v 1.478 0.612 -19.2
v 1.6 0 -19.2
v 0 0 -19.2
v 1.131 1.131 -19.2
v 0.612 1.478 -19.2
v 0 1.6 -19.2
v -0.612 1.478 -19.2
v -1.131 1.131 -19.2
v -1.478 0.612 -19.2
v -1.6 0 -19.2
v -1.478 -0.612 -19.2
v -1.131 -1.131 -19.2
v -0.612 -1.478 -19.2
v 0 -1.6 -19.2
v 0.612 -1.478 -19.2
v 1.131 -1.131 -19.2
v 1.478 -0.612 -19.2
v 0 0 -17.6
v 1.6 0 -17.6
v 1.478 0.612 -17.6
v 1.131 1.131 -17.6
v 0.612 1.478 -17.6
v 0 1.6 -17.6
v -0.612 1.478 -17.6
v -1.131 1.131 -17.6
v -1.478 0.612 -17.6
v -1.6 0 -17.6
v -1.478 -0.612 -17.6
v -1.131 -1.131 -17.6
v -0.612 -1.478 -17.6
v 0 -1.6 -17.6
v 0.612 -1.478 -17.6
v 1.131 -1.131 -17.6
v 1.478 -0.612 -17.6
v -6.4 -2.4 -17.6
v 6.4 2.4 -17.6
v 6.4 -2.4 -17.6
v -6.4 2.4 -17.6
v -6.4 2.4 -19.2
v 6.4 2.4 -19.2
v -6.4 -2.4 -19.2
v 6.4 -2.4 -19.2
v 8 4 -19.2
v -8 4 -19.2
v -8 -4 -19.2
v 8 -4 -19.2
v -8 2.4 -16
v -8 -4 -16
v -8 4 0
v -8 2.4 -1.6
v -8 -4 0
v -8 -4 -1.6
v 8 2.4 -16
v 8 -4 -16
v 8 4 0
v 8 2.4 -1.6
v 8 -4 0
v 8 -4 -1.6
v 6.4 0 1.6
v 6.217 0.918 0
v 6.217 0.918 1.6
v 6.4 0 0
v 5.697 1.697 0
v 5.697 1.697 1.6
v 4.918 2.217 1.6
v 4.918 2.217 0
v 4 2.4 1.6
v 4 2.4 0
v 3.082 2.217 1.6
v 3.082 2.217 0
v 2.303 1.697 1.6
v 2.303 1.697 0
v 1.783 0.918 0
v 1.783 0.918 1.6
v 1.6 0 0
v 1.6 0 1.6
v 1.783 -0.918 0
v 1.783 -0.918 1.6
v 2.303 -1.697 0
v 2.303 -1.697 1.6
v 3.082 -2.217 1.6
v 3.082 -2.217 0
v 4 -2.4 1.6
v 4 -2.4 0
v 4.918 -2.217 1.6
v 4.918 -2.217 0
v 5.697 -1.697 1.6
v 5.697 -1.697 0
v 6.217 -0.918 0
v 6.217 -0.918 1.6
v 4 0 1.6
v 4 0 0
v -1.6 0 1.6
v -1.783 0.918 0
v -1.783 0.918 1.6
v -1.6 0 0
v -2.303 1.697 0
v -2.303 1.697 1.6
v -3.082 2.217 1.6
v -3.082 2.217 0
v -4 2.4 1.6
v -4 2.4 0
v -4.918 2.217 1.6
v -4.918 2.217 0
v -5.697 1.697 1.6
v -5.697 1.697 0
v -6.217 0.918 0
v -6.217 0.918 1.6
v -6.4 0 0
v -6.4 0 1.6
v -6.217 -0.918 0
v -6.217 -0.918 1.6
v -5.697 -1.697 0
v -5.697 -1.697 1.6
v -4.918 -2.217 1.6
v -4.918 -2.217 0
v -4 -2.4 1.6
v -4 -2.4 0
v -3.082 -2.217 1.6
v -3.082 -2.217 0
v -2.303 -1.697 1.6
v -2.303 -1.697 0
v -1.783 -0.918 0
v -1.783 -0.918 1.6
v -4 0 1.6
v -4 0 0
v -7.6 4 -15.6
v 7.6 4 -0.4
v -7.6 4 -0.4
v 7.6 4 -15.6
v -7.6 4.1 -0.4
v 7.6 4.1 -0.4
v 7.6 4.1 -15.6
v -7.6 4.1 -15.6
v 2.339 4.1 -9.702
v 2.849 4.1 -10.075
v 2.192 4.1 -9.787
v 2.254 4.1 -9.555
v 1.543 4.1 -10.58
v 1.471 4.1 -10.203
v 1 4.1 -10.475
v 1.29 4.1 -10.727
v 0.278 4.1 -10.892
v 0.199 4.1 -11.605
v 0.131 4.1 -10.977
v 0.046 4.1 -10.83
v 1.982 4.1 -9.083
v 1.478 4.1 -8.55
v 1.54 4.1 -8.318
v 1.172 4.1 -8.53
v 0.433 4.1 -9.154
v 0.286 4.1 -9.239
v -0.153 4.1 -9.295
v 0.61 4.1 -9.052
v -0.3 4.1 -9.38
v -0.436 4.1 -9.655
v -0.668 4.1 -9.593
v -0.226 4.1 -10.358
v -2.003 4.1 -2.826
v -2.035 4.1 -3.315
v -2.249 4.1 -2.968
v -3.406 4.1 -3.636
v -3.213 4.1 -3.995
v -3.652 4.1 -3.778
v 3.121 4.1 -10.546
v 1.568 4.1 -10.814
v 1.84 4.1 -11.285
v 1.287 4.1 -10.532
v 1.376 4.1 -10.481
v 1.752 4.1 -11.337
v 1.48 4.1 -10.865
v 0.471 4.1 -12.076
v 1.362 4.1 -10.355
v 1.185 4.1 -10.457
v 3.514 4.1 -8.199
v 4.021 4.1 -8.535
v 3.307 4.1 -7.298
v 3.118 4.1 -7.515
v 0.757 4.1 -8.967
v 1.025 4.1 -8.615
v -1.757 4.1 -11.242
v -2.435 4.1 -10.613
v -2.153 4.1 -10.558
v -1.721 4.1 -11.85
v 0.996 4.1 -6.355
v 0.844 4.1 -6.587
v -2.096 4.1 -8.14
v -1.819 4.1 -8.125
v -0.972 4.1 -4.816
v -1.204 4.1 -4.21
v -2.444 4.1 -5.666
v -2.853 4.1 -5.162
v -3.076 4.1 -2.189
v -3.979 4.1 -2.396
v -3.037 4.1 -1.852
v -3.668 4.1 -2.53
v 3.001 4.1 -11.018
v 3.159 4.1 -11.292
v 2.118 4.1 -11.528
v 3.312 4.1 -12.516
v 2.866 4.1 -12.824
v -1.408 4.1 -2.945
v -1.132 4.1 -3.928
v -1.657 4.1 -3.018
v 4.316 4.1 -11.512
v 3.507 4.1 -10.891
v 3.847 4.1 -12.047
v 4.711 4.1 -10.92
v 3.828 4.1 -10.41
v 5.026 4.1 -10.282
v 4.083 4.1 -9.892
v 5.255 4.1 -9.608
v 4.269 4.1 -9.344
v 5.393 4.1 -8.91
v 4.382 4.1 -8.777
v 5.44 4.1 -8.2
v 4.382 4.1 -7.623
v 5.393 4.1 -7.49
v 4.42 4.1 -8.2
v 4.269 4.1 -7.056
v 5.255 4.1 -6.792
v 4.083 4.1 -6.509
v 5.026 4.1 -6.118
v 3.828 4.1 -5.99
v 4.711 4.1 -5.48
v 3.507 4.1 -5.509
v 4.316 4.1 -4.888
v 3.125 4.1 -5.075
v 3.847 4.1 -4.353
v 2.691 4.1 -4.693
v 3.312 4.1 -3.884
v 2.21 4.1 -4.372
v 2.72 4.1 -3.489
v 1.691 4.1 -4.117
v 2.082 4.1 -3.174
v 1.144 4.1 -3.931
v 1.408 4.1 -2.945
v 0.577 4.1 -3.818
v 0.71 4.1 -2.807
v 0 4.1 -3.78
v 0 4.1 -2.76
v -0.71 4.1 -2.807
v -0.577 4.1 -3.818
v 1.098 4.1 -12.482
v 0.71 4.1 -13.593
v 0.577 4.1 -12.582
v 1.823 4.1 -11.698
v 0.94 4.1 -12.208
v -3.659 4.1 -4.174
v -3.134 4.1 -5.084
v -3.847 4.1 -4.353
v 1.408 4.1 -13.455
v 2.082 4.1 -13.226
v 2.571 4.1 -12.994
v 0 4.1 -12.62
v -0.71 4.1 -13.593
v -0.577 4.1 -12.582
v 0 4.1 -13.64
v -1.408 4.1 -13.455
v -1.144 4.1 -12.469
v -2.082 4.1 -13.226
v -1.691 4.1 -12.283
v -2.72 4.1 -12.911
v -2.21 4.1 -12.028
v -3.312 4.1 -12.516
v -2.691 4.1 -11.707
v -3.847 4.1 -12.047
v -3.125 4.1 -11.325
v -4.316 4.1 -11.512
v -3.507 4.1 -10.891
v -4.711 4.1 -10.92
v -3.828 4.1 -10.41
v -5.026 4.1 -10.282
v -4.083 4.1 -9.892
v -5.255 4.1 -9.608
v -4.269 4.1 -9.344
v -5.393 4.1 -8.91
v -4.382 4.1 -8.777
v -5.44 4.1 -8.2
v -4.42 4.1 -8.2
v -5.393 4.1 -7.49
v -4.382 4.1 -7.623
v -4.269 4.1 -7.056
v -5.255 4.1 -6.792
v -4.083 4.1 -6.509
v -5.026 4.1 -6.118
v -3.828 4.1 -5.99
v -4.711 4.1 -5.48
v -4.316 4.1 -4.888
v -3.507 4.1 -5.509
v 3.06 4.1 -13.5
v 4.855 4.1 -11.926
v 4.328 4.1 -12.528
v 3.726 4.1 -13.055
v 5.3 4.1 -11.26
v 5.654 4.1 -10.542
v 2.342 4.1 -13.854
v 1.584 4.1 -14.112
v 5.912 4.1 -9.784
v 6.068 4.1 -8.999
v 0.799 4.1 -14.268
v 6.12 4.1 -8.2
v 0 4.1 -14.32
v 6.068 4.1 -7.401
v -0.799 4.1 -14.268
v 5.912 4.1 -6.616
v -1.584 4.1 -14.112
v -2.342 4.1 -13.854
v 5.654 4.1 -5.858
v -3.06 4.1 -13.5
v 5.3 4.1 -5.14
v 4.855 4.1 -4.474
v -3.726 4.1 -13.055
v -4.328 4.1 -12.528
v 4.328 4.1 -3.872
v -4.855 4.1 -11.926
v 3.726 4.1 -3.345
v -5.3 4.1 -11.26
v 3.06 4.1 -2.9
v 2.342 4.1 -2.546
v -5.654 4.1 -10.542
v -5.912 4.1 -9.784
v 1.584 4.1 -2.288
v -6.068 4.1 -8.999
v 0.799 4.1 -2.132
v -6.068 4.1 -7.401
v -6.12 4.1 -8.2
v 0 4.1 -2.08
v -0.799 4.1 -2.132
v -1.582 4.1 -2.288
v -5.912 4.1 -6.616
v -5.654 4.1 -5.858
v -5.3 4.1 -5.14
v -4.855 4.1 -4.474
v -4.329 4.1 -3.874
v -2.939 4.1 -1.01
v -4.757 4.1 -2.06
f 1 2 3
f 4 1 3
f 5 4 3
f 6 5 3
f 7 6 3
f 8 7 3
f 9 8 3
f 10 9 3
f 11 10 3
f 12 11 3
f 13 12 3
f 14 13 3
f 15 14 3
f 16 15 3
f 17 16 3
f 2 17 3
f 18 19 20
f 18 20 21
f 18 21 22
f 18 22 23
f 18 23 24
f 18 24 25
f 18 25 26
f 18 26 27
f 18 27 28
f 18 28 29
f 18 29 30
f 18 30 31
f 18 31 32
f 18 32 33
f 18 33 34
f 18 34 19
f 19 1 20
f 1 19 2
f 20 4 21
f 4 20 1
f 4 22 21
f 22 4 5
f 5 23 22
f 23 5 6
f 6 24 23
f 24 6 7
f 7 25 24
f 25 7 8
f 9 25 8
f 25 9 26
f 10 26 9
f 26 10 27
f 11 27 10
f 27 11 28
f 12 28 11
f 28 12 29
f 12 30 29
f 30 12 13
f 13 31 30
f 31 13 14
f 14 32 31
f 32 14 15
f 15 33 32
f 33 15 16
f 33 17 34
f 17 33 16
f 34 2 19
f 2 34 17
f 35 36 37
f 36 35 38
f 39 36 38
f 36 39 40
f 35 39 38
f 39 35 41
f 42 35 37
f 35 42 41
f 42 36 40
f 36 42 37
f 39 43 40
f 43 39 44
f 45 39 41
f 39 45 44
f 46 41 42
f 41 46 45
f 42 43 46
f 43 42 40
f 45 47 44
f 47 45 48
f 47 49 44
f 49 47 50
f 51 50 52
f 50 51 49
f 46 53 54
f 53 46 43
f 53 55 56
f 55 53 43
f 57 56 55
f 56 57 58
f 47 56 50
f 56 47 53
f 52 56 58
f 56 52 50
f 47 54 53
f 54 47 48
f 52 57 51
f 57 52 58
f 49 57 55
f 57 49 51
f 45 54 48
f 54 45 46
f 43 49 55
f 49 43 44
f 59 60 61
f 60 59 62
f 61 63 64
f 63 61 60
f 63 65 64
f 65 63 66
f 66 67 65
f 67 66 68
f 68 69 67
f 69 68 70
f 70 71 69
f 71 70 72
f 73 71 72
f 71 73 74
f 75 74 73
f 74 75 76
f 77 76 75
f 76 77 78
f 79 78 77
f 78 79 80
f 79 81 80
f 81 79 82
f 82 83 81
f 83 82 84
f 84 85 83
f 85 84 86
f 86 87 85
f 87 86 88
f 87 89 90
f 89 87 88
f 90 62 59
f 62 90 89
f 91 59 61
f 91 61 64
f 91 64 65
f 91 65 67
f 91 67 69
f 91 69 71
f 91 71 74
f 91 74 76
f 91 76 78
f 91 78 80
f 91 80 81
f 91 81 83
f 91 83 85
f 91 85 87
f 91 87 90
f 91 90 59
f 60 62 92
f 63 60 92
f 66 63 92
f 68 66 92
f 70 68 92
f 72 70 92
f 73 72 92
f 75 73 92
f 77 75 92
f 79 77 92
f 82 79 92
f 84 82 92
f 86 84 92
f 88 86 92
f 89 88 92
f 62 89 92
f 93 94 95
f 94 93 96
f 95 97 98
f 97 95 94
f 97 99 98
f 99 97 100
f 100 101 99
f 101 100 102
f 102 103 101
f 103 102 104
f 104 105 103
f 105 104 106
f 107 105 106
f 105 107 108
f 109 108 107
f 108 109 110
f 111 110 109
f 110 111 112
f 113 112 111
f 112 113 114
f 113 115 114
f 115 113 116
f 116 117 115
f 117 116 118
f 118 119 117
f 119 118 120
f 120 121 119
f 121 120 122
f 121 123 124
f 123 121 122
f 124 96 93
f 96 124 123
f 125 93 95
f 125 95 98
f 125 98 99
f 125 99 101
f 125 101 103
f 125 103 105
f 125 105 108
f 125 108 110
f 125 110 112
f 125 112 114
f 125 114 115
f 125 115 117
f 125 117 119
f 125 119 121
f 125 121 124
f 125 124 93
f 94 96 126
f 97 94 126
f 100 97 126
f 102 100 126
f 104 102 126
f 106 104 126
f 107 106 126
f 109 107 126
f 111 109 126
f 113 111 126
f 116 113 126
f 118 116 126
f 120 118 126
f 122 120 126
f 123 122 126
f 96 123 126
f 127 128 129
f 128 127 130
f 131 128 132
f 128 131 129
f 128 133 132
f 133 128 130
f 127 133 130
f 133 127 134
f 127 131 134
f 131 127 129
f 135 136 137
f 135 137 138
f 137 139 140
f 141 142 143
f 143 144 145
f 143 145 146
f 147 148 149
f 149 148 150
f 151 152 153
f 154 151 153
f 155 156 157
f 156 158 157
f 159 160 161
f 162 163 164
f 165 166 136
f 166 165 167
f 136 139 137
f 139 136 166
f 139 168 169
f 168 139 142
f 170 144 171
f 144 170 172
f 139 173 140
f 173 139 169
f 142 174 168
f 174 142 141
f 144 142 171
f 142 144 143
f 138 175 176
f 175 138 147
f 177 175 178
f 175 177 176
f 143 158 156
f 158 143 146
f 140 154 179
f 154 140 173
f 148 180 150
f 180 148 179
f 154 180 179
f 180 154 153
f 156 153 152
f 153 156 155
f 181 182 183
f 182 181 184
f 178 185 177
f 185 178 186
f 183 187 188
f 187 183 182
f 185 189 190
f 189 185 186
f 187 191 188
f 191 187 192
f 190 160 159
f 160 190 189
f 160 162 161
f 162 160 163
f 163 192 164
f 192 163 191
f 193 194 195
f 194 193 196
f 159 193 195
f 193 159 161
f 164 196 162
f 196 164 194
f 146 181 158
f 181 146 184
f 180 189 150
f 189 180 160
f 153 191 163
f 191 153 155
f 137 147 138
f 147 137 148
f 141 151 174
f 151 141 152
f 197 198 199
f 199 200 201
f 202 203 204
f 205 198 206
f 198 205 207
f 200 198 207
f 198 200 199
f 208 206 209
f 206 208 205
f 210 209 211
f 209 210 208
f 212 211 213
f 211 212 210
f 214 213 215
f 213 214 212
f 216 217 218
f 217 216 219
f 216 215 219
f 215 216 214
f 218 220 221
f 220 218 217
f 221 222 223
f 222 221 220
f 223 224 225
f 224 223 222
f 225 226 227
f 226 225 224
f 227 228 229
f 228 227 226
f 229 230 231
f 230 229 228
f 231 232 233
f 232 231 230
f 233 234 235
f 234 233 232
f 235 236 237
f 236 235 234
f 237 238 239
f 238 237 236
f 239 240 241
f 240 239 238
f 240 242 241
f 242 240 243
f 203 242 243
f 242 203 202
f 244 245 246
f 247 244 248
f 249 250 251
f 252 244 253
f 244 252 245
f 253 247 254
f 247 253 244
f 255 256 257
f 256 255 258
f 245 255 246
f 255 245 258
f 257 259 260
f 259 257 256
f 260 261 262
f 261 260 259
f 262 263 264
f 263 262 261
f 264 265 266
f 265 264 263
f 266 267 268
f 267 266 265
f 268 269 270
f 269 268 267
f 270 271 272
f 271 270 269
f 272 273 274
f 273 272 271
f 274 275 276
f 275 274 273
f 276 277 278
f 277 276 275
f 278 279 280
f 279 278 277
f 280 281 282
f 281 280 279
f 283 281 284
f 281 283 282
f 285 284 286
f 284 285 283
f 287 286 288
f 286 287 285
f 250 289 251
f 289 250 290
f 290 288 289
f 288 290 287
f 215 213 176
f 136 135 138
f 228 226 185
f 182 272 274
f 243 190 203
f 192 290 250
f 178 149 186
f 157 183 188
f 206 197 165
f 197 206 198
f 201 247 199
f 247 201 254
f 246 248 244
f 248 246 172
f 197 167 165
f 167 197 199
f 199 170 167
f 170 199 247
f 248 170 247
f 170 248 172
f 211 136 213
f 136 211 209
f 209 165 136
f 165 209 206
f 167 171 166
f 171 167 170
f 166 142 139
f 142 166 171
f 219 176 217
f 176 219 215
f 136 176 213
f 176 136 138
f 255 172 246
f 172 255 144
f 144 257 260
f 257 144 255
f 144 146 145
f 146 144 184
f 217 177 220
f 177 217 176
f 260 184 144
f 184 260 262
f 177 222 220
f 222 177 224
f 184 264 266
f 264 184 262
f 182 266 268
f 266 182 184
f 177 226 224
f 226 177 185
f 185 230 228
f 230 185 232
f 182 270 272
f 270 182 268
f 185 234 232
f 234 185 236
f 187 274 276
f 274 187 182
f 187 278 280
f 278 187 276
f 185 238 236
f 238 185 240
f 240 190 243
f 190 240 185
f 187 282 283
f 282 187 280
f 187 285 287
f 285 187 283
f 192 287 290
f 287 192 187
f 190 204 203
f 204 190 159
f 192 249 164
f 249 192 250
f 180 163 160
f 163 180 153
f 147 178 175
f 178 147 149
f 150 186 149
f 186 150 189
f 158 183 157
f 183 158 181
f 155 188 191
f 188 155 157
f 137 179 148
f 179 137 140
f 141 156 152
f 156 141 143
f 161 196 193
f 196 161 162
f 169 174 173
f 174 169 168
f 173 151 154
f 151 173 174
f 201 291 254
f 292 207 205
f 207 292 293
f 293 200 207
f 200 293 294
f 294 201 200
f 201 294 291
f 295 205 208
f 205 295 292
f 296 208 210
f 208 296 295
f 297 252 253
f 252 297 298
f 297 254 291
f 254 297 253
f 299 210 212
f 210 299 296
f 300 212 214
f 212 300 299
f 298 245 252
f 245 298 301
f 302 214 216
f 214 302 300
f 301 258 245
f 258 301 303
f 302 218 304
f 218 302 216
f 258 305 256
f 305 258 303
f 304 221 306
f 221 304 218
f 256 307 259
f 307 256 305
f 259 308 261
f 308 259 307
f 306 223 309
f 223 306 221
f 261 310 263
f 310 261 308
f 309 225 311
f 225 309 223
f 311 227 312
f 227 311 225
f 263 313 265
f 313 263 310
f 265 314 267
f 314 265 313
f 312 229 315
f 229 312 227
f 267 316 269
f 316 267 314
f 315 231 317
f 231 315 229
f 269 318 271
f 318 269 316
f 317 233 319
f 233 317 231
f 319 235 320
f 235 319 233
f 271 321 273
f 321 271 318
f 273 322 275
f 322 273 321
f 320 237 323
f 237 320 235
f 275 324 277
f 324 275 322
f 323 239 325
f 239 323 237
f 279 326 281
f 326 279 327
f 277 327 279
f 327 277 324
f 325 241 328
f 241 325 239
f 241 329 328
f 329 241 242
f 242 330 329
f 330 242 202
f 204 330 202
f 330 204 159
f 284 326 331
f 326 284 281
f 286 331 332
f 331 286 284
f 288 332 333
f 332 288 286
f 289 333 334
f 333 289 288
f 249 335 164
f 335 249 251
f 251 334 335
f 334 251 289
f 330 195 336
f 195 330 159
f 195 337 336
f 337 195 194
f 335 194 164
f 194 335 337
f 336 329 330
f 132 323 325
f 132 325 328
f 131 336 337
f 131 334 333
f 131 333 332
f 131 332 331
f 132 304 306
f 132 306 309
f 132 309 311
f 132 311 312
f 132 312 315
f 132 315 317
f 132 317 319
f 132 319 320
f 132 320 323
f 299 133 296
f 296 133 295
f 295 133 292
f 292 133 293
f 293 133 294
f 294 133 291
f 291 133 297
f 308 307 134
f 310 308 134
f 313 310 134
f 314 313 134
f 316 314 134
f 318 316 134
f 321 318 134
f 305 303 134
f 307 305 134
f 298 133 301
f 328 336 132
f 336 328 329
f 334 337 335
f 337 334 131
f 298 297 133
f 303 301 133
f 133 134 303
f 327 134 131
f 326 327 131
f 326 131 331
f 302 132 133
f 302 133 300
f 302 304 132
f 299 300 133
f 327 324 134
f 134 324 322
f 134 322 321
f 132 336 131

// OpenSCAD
use <../lib.scad>
use <169655e.scad>
use <4864a.scad>
function ldraw_lib__4864ad05() = [
// 0 Panel  1 x  2 x  2 with Launch Command Logo with White Border Facing Right Sticker
// 0 Name: 4864ad05.dat
// 0 Author: Chris Böhnke [KnightOfTarenta]
// 0 !LDRAW_ORG Shortcut UPDATE 2026-02
// 0 !LICENSE Licensed under CC BY 4.0 : see CAreadme.txt
// 
// 0 BFC CERTIFY CCW
  [0,"BFC","CERTIFY"],
  [0,"BFC","CCW"],
// 
// 0 !CATEGORY Sticker Shortcut
// 
// 0 !KEYWORDS Bricklink 4864apb006R, BrickOwl 86397, Launch Command, Set 6544
// 0 !KEYWORDS Shuttle Transcon 2, space port, stamp, town
// 
// 0 !PREVIEW 16 0 0 0 -1 0 0 0 1 0 0 0 -1
// 
// 0 !HISTORY 2026-03-06 [OrionP] Official Update 2026-02
// 
// 1 16 0 0 0 1 0 0 0 1 0 0 0 1 4864a.dat
  [1,16,0,0,0,1,0,0,0,1,0,0,0,1, ldraw_lib__4864a()],
// 1 16 0 20 10 -1 0 0 0 0 -1 0 -1 0 169655e.dat
  [1,16,0,20,10,-1,0,0,0,0,-1,0,-1,0, ldraw_lib__169655e()],
];
module ldraw_lib__4864ad05(step=0, col=false, unit=2/5, alt=false, line=0.2, solid=!$preview)
    makepoly(ldraw_lib__4864ad05(), step=step, col=col, unit=unit, alt=alt, line=line, solid=solid);
ldraw_lib__4864ad05(line=0.2);
